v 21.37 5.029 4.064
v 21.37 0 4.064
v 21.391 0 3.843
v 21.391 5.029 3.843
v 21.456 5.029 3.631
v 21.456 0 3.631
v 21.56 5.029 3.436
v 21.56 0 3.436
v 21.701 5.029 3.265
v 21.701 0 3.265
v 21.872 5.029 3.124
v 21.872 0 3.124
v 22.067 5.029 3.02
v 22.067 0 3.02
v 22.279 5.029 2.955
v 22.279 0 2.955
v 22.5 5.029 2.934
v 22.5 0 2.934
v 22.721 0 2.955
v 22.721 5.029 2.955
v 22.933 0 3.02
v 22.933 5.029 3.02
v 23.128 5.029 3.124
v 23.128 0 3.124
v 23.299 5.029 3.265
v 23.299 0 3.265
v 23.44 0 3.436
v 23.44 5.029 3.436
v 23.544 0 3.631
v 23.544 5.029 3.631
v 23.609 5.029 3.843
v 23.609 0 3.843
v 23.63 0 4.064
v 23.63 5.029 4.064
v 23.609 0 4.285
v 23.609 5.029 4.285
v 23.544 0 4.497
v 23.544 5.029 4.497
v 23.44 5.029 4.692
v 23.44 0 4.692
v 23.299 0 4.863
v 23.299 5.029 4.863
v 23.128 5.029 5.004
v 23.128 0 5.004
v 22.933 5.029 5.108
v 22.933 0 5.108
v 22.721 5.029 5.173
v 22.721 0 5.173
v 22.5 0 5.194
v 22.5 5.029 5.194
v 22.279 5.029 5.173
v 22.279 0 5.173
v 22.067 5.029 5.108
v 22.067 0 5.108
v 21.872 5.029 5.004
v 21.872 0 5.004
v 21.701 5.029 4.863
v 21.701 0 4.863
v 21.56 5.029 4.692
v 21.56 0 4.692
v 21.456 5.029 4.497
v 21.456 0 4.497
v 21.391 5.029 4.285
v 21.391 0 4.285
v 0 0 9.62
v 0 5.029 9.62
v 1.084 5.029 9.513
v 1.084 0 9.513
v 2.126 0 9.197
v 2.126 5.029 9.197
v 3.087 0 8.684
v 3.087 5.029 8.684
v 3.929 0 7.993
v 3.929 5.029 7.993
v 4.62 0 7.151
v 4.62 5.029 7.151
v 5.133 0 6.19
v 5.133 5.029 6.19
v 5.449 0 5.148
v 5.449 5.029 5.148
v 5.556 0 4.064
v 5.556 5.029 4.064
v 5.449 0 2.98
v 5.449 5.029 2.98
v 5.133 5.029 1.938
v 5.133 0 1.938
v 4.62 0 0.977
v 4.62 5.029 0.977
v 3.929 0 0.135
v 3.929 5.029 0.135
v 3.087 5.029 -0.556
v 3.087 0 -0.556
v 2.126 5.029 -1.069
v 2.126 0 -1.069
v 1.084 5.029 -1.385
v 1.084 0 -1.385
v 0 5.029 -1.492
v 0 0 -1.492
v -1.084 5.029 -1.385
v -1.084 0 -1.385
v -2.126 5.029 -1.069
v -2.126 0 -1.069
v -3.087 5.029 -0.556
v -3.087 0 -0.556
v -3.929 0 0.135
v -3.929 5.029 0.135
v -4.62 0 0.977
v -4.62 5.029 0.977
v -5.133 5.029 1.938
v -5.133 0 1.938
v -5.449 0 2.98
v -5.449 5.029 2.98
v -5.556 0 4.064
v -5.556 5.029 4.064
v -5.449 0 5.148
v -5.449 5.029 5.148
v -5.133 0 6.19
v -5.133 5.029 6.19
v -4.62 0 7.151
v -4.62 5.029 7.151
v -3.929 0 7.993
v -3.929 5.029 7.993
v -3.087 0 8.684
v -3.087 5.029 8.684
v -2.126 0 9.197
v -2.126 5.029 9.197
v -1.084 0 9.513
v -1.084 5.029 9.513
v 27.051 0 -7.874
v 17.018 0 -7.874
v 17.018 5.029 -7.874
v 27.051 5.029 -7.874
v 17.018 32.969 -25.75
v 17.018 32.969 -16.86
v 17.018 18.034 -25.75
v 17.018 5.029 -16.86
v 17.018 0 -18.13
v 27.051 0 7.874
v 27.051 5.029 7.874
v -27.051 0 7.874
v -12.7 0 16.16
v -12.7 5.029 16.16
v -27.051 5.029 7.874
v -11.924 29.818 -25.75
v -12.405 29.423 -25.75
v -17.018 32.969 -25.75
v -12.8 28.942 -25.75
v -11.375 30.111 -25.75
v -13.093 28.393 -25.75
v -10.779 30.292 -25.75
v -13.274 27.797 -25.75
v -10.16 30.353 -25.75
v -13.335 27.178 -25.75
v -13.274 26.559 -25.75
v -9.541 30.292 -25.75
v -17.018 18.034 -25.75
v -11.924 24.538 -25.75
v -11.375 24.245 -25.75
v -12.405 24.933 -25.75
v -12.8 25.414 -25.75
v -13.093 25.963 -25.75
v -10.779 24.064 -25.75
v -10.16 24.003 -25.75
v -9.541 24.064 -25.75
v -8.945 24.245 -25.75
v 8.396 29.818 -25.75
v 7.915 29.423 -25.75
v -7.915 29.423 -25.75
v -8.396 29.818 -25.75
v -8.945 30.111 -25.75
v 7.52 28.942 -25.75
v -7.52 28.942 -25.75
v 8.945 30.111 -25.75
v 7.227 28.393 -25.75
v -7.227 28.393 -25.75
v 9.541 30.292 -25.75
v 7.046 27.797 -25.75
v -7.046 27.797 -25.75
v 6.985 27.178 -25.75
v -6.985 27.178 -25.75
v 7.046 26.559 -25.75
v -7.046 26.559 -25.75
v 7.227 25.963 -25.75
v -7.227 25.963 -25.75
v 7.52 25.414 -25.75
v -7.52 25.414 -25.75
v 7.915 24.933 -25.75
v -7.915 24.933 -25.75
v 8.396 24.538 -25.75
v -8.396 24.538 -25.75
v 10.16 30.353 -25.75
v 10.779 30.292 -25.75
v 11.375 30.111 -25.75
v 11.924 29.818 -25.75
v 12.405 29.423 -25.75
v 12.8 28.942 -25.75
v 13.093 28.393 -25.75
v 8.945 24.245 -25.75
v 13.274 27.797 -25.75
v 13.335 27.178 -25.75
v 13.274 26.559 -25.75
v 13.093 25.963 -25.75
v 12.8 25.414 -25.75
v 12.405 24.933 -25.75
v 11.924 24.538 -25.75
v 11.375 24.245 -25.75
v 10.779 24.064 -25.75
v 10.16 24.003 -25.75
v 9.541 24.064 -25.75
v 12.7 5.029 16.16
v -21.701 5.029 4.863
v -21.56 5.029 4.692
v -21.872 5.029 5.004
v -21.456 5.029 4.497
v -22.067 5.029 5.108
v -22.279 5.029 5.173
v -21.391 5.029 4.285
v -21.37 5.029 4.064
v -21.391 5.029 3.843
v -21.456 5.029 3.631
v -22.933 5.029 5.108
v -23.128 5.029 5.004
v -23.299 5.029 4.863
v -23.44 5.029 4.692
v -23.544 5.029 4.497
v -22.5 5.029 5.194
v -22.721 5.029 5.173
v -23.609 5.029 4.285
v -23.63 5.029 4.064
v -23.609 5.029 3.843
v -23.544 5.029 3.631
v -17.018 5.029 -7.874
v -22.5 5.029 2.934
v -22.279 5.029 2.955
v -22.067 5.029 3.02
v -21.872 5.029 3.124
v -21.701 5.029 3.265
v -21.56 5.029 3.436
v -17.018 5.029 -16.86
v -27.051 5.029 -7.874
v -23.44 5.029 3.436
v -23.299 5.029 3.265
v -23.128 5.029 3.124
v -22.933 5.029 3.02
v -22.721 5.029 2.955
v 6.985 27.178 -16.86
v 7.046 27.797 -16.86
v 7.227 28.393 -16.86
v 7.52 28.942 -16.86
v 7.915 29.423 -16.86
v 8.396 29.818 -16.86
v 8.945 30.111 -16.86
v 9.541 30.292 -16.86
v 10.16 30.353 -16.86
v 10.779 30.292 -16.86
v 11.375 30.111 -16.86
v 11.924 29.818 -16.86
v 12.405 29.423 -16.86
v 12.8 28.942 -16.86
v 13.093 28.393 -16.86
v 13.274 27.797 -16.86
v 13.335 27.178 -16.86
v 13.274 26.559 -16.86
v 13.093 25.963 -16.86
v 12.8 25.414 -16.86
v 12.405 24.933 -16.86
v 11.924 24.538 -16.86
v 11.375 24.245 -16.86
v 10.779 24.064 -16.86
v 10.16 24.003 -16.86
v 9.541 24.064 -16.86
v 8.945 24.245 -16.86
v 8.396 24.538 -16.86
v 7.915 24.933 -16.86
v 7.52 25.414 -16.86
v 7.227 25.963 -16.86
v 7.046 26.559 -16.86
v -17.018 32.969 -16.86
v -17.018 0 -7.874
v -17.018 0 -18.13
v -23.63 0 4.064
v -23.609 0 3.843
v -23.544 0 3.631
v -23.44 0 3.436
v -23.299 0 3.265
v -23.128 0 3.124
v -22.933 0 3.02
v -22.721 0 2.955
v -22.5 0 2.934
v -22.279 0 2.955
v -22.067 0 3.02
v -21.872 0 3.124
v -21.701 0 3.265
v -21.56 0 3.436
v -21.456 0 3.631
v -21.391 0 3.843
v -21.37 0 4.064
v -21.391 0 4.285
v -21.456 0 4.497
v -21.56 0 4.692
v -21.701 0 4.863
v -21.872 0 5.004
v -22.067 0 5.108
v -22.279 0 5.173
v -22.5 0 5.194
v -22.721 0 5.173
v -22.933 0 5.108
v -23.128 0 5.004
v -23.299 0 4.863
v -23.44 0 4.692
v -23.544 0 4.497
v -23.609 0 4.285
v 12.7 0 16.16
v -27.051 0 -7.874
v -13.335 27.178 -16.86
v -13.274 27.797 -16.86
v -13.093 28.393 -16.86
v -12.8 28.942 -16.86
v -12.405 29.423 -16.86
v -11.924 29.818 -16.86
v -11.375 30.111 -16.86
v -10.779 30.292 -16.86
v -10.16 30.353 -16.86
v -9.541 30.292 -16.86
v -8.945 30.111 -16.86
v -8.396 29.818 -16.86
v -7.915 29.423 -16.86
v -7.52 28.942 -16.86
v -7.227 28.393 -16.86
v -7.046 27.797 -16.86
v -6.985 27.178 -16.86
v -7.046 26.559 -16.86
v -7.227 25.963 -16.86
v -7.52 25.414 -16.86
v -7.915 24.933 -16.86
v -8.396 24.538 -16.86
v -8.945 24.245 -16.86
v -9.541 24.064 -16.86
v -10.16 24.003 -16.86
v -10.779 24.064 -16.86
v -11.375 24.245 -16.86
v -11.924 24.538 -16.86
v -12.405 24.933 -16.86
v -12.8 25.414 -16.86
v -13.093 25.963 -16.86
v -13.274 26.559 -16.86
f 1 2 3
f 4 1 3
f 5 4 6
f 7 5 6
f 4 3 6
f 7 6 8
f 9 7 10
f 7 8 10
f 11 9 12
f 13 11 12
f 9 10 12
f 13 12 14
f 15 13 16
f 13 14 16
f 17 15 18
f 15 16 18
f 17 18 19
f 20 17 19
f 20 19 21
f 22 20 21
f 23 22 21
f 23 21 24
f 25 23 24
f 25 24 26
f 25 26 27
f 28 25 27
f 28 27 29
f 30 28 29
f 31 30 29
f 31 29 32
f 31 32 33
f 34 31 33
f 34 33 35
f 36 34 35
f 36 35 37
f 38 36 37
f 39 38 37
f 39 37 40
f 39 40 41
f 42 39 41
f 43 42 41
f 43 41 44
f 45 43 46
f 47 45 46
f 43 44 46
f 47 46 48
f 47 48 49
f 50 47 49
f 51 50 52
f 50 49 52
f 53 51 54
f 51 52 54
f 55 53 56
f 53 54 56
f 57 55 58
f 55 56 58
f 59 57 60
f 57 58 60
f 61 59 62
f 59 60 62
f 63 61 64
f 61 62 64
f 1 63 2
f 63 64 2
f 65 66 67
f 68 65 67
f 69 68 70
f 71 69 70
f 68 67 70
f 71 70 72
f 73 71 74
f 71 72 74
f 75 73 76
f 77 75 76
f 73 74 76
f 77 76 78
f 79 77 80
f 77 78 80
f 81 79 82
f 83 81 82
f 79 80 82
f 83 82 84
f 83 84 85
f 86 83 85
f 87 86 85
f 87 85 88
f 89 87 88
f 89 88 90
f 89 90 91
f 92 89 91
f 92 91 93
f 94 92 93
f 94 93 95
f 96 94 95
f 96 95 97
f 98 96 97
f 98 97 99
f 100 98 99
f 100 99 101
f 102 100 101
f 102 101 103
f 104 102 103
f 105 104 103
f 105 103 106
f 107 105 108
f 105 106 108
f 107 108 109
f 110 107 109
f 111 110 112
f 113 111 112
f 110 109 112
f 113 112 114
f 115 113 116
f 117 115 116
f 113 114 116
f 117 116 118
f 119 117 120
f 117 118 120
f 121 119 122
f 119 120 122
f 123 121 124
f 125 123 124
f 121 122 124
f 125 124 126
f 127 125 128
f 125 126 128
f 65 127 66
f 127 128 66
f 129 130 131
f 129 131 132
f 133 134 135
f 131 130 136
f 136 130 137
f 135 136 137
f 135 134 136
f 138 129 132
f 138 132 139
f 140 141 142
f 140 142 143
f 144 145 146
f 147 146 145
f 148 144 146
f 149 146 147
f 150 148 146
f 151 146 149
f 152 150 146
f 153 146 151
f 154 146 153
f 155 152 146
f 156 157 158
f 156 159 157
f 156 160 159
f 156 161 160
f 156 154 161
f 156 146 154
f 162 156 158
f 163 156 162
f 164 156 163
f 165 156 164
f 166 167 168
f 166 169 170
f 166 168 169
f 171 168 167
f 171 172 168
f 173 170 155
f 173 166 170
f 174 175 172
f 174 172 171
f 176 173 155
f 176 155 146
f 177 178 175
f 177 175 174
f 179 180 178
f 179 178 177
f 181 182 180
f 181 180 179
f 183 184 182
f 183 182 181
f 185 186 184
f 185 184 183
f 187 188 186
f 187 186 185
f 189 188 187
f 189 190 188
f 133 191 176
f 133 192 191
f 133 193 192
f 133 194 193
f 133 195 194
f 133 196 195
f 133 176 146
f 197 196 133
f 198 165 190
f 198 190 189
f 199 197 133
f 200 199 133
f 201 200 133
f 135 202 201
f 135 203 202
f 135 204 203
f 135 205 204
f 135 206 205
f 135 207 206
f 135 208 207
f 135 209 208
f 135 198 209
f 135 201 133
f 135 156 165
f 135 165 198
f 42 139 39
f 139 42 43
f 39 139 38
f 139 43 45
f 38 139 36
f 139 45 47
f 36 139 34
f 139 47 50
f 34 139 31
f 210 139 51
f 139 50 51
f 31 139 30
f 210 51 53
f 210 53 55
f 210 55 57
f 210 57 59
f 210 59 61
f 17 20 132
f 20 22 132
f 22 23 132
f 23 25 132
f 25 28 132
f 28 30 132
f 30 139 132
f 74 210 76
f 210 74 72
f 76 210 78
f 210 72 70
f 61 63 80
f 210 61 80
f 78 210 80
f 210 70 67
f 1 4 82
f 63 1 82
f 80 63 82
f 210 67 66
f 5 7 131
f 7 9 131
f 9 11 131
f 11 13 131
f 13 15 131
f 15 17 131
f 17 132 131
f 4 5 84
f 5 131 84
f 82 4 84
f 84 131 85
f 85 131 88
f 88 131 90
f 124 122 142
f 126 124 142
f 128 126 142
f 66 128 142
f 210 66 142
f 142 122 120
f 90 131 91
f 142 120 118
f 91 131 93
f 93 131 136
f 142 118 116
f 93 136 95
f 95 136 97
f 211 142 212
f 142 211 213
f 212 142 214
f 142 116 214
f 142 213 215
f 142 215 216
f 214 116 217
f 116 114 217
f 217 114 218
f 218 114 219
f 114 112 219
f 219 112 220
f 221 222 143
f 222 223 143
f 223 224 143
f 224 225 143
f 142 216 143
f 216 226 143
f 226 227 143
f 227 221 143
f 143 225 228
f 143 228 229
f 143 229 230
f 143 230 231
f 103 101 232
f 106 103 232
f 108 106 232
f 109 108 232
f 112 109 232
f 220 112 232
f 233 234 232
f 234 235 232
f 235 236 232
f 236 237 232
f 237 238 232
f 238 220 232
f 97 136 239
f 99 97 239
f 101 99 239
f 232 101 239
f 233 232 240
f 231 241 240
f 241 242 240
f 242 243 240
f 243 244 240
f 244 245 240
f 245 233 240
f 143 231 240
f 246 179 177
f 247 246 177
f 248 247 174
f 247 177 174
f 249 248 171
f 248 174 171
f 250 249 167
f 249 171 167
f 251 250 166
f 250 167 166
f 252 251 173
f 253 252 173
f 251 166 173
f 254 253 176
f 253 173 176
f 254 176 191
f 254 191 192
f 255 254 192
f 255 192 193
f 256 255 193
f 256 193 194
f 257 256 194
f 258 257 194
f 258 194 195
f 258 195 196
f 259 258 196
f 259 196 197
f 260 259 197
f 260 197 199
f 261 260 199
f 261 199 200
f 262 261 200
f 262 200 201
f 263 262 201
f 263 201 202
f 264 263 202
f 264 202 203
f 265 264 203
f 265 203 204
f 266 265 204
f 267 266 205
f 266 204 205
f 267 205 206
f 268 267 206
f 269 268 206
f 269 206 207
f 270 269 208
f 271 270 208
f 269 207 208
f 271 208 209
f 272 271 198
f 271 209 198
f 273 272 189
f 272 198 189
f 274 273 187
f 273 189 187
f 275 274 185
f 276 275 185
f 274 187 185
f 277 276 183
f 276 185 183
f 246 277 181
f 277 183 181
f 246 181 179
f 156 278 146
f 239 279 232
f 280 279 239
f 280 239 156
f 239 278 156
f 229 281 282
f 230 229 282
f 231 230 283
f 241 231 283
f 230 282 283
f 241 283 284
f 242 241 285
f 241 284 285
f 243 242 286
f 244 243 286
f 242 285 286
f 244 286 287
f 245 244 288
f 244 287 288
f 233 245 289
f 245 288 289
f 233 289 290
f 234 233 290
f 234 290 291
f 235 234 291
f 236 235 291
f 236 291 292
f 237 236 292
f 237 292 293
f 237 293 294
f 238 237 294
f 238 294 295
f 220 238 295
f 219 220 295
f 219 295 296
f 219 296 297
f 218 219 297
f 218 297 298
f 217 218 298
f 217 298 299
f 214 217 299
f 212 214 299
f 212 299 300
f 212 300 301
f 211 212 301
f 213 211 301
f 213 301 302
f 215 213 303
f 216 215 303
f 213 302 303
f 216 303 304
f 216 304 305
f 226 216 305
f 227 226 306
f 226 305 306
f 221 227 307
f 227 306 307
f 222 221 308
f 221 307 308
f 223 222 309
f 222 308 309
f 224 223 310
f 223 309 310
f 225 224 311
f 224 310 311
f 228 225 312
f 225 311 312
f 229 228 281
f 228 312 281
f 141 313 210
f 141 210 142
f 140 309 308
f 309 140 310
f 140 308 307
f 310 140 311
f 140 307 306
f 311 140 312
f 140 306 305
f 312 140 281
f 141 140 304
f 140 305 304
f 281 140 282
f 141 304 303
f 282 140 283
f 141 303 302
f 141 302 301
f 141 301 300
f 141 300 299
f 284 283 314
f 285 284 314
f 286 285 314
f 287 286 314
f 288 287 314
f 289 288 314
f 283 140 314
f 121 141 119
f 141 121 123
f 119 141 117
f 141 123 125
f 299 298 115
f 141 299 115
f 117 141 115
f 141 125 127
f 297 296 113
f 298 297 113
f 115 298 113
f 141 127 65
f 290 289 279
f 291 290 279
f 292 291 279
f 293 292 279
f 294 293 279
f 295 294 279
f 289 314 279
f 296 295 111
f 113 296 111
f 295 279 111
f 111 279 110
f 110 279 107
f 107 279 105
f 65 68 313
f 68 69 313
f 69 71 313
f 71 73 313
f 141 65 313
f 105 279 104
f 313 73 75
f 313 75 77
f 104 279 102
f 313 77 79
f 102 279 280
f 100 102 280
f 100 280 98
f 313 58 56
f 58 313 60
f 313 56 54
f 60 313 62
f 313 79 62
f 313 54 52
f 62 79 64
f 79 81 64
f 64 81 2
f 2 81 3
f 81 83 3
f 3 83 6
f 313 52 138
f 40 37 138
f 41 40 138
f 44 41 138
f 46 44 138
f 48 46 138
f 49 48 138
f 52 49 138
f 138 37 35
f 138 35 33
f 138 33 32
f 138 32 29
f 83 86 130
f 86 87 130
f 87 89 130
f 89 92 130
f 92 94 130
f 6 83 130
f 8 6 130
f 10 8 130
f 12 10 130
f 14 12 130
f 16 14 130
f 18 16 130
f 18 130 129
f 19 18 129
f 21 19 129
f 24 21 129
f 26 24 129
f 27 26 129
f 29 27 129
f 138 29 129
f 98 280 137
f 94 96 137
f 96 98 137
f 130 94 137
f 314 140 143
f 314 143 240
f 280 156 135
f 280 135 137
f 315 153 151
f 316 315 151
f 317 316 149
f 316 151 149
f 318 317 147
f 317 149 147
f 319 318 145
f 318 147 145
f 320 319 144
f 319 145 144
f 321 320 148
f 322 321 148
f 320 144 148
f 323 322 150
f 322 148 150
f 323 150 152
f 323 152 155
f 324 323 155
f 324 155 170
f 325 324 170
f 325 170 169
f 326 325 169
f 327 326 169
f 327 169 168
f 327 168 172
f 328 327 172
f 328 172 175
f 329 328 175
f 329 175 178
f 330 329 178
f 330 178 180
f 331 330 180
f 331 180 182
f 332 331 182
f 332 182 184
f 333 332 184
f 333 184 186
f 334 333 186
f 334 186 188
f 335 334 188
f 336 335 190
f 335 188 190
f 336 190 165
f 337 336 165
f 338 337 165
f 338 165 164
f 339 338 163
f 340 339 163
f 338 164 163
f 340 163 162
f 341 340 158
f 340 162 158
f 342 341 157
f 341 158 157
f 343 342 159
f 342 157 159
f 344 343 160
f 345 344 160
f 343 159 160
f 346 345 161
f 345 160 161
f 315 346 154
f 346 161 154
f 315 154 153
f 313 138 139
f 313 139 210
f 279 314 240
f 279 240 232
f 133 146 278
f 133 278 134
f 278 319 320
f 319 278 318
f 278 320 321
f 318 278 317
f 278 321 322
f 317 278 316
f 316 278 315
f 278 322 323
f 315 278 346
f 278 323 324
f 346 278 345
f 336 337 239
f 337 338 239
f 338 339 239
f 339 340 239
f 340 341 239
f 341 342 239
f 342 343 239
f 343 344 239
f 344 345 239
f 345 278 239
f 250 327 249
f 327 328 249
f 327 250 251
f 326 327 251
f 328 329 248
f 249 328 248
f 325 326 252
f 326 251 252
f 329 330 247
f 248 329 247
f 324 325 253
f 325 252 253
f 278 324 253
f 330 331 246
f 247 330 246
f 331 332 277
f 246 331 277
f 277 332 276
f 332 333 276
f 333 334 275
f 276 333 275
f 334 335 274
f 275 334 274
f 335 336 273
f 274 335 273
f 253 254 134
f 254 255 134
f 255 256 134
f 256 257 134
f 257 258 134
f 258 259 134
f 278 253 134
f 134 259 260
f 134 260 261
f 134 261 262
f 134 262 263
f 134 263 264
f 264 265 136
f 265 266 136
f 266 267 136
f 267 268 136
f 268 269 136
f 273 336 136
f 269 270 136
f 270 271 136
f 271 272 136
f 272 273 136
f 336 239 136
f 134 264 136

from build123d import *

# Parameters (mm, degrees)
BOSS_EXTRUDE1_DEPTH         = 5.0292
SKETCH2_W                   = 34.036
SKETCH2_H                   = 8.89
BOSS_EXTRUDE2_DEPTH         = 32.9692
CUT_EXTRUDE1_DEPTH          = 61.762903104
CUT_EXTRUDE1_DEPTH_BACK     = 61.762903104
F_1_4_0_25_DIAMETER_HOLE1_D = 6.35
SKETCH7_R                   = 5.55625
CUT_EXTRUDE2_DEPTH          = 47.642102064
F_4_40_TAPPED_HOLE1_D       = 2.2606


with BuildPart() as part:
    # Sketch1 → Boss-Extrude1 (new body)
    with BuildSketch(Plane(origin=(0, 0, 0), x_dir=(1, 0, 0), z_dir=(0, 1, 0))):
        Polygon((-27.051, 7.874), (-17.018, 7.874), (-17.018, 16.860446287), (17.018, 16.860446287), (17.018, 7.874), (27.051, 7.874), (27.051, -7.874), (12.7, -16.159553713), (-12.7, -16.159553713), (-27.051, -7.874), align=None)
    extrude(amount=BOSS_EXTRUDE1_DEPTH)

    # Sketch2 → Boss-Extrude2 (add)
    with BuildSketch(Plane(origin=(0, 0, 0), x_dir=(1, 0, 0), z_dir=(0, 1, 0))):
        with Locations((0, 21.305446287)):
            Rectangle(SKETCH2_W, SKETCH2_H)
    extrude(amount=BOSS_EXTRUDE2_DEPTH)

    # Sketch3 → Cut-Extrude1 (cut, two sides: drawn at the far end of the back side and taken through both)
    with BuildSketch(Plane(origin=(17.018, 0, 0), x_dir=(0, 0, -1), z_dir=(1, 0, 0)).offset(-CUT_EXTRUDE1_DEPTH_BACK)):
        Polygon((66.671605927, 114.880744481), (25.750446287, 18.034), (18.130446287, 0), (-22.790713353, -96.846744481), (170.902775608, -178.68906376), (260.365094888, 33.038425201), align=None)
    extrude(amount=CUT_EXTRUDE1_DEPTH + CUT_EXTRUDE1_DEPTH_BACK, mode=Mode.SUBTRACT)

    # 1/4 (0.25) Diameter Hole1 (through all)
    with Locations(Plane.XY.offset(-16.860446287)):
        with Locations((-10.16, 27.178), (10.16, 27.178)):
            Hole(F_1_4_0_25_DIAMETER_HOLE1_D / 2)

    # Sketch7 → Cut-Extrude2 (cut, through all)
    with BuildSketch(Plane(origin=(0, 5.0292, 0), x_dir=(1, 0, 0), z_dir=(0, 1, 0))):
        with Locations(Location((0, -4.064, 0), (0, 0, 270))):
            Circle(SKETCH7_R)
    extrude(amount=-CUT_EXTRUDE2_DEPTH, mode=Mode.SUBTRACT)

    # #4-40 Tapped Hole1 (through all)
    with Locations(Plane(origin=(0, 5.0292, 0), x_dir=(1, 0, 0), z_dir=(0, 1, 0))):
        with Locations((0, 0), (-22.5, -4.064), (22.5, -4.064)):
            Hole(F_4_40_TAPPED_HOLE1_D / 2)


solid = part.part
